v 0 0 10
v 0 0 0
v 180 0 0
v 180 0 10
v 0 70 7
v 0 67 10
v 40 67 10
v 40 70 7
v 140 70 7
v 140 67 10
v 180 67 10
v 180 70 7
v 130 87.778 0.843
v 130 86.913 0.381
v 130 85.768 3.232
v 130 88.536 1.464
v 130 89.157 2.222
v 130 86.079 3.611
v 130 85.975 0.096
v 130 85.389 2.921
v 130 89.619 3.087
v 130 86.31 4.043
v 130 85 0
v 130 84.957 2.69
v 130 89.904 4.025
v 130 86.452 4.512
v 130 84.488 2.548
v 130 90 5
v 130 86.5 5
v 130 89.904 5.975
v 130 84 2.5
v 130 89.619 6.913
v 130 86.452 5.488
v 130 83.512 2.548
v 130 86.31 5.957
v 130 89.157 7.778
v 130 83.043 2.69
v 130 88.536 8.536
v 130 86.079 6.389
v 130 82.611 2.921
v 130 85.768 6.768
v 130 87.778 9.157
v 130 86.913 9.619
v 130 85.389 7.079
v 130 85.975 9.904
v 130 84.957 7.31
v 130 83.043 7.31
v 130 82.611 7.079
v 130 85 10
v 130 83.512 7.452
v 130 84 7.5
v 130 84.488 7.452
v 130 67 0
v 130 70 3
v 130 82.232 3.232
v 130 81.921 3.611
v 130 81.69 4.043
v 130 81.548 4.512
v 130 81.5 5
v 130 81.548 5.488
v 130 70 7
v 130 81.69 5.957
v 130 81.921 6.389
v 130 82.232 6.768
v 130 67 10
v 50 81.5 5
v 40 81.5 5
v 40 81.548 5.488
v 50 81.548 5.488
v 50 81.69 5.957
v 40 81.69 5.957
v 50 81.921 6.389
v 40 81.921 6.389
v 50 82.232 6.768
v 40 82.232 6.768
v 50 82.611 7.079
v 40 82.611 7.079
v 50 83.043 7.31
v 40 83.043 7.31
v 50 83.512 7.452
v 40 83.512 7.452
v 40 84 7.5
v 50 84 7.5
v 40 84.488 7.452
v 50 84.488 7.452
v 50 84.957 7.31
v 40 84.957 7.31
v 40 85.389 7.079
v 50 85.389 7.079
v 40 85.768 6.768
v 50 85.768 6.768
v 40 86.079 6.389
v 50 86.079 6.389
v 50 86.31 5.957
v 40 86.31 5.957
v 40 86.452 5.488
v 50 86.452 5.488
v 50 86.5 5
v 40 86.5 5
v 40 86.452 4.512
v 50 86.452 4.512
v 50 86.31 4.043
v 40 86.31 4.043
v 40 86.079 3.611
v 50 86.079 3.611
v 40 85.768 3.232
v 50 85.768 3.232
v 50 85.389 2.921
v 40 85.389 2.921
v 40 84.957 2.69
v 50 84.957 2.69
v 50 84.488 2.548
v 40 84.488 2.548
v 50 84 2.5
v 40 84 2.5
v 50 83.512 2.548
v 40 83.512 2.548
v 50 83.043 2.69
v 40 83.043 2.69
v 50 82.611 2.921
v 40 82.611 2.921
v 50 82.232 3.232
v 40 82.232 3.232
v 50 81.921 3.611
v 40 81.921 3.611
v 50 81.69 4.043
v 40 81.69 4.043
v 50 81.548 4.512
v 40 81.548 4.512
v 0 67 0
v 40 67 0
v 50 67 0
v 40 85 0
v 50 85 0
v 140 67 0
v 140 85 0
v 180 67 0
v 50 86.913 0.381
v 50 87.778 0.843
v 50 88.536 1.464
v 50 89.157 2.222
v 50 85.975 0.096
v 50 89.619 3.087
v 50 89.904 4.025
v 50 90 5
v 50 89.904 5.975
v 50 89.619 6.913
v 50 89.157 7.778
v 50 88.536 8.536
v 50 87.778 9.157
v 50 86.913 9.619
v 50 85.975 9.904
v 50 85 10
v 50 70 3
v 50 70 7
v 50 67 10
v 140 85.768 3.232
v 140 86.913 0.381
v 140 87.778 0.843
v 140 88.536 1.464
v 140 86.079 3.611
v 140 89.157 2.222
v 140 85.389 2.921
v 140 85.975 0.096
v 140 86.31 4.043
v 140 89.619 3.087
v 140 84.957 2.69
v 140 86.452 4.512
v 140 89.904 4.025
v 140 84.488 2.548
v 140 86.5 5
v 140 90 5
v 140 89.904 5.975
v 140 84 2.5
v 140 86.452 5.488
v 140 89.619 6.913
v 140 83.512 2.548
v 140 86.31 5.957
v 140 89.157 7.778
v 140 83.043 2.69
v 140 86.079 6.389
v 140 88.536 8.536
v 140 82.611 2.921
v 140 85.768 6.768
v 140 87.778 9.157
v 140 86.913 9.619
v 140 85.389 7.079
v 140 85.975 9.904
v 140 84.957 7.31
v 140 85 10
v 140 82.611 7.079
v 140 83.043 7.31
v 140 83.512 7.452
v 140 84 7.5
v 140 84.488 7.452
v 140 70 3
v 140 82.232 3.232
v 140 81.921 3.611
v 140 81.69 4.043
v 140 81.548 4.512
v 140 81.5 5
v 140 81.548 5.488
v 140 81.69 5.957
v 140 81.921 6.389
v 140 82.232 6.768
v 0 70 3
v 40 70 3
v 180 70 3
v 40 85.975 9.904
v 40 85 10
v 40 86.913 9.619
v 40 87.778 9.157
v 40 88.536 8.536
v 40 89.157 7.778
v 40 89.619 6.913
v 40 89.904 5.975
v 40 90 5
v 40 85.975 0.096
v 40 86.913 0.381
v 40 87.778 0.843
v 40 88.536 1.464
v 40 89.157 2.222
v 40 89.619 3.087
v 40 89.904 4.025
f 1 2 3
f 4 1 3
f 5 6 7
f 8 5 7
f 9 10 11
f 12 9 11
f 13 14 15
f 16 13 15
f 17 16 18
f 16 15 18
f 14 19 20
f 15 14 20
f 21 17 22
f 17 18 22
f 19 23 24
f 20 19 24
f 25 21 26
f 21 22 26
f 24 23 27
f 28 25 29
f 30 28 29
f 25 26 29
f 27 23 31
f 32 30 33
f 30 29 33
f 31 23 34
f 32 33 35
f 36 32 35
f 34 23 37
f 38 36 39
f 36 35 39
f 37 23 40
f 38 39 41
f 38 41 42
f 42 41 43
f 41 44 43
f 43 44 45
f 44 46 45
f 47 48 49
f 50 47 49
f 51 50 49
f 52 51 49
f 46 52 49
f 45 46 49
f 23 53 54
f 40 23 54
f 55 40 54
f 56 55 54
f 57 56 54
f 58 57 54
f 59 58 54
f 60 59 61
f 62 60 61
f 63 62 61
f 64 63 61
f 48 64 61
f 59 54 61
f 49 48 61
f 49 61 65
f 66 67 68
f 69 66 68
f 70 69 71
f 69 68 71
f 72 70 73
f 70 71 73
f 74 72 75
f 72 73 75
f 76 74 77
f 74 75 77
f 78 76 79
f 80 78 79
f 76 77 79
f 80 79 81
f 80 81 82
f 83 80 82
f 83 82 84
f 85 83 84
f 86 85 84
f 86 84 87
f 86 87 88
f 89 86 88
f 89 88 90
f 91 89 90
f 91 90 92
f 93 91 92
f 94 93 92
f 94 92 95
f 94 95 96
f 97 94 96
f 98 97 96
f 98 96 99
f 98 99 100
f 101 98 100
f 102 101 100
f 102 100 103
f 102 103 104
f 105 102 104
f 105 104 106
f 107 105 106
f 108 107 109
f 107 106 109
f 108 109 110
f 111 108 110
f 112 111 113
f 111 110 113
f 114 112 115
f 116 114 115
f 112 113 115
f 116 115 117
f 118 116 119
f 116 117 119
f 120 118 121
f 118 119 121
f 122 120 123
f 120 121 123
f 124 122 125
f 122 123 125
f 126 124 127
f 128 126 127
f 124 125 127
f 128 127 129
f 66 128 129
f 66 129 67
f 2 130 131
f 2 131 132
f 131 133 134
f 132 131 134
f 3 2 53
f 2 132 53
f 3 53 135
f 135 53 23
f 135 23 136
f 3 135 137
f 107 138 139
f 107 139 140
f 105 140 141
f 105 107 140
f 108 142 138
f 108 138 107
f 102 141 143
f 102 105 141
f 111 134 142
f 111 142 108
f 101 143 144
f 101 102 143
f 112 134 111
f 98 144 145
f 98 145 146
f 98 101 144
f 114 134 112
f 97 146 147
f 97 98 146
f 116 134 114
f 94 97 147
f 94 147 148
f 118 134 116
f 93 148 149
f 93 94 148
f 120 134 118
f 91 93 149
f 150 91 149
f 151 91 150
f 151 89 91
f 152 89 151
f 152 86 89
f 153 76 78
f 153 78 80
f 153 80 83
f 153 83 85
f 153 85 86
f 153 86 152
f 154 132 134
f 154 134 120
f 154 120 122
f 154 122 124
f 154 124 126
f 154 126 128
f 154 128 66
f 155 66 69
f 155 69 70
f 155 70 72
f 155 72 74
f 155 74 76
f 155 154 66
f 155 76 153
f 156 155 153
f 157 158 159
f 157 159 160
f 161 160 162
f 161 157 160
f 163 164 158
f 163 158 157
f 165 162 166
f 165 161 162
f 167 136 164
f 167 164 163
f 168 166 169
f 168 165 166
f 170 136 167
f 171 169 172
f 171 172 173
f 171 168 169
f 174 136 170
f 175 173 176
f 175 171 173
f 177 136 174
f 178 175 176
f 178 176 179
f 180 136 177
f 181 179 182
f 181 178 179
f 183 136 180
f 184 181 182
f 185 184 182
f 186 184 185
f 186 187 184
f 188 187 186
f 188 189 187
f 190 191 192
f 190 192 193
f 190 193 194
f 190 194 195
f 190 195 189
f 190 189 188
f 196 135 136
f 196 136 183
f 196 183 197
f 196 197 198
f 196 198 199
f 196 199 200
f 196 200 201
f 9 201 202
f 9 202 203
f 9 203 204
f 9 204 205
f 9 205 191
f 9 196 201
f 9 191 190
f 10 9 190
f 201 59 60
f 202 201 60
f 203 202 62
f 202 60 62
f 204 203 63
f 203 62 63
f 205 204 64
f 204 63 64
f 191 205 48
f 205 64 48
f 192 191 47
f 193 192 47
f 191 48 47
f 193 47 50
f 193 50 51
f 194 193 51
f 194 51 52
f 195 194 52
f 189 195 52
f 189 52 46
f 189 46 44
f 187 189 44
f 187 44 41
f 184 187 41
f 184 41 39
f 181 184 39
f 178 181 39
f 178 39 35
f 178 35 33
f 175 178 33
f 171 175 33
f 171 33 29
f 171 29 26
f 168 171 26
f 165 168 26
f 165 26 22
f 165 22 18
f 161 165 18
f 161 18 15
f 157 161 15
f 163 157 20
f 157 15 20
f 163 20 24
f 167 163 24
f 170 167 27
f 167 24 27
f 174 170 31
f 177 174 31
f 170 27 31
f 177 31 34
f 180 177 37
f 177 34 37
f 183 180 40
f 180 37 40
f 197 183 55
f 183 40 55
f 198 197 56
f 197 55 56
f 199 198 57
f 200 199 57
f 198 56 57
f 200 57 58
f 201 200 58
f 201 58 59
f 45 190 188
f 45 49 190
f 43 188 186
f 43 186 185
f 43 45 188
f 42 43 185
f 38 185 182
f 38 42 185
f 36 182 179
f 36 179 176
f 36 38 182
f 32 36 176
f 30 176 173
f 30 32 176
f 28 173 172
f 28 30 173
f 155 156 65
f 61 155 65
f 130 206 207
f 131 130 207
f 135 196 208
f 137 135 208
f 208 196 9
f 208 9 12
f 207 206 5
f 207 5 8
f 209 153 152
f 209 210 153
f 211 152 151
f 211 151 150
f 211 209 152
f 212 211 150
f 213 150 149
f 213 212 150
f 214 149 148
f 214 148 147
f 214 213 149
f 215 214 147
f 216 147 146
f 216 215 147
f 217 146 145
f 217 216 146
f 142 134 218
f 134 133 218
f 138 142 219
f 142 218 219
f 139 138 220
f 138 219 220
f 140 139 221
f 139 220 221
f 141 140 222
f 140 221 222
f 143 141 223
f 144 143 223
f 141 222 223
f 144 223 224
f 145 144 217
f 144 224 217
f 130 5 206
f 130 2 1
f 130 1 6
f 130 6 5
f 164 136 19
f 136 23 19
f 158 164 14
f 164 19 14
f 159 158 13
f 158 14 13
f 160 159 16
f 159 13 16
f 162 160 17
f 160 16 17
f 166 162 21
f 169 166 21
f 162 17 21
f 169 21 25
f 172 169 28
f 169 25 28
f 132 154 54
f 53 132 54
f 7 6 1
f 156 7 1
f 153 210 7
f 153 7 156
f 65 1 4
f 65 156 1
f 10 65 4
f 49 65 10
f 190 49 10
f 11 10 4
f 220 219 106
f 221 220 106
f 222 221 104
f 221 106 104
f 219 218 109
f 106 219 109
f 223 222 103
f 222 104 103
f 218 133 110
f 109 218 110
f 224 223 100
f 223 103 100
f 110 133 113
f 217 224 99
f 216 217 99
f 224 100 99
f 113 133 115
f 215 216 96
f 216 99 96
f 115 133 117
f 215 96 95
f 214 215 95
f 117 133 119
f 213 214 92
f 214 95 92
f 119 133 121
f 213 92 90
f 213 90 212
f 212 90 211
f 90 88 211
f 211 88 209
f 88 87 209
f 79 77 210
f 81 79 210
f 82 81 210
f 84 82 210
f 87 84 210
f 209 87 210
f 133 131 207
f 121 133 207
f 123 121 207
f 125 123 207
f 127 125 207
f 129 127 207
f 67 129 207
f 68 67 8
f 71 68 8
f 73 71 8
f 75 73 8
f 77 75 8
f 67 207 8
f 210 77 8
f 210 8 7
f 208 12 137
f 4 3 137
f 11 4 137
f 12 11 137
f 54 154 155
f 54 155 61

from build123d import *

# Parameters (mm, degrees)
F0_W     = 180
F0_H     = 70
F1_DEPTH = 10
F3_W     = 10
F3_H     = 10
F4_DEPTH = 20
F5_R     = 2.5
F6_DEPTH = 140.001
F7_R     = 4.99999
F8_SIZE  = 3


# Not quite as in the source:
# - a fillet or chamfer is up to 0.001 mm smaller than in the source, because OpenCascade refuses the exact size


with BuildPart() as f1:
    # F0 (on Top) → F1 (new body)
    with BuildSketch(Plane.XY):
        with Locations((90, 35)):
            Rectangle(F0_W, F0_H)
    extrude(amount=F1_DEPTH)

    # F3 (on face) → F4 (join)
    with BuildSketch(Plane(origin=(0, 70, 0), x_dir=(-1, 0, 0), z_dir=(0, 1, 0))):
        with Locations((-135, 5)):
            Rectangle(F3_W, F3_H)
        with Locations((-45, 5)):
            Rectangle(F3_W, F3_H)
    extrude(amount=F4_DEPTH)

    # F5 (on face) → F6 (cut, through all)
    with BuildSketch(Plane(origin=(40, 0, 0), x_dir=(0, -1, 0), z_dir=(-1, 0, 0))):
        with Locations((-84, 5)):
            Circle(F5_R)
    extrude(amount=-F6_DEPTH, mode=Mode.SUBTRACT)

    # F7 (radius 5 in the source; OpenCascade refuses exactly that, so slightly less here)
    f7_edges = [f1.edges().sort_by_distance(p)[0] for p in [
        (135, 90, 10),
        (135, 90, 0),
        (45, 90, 0),
        (45, 90, 10),
    ]]
    fillet(f7_edges, radius=F7_R)

    # F8
    f8_edges = [f1.edges().sort_by_distance(p)[0] for p in [
        (90, 70, 10),
        (20, 70, 10),
        (160, 70, 10),
        (160, 70, 0),
        (90, 70, 0),
        (20, 70, 0),
    ]]
    chamfer(f8_edges, length=F8_SIZE)


solid = f1.part
